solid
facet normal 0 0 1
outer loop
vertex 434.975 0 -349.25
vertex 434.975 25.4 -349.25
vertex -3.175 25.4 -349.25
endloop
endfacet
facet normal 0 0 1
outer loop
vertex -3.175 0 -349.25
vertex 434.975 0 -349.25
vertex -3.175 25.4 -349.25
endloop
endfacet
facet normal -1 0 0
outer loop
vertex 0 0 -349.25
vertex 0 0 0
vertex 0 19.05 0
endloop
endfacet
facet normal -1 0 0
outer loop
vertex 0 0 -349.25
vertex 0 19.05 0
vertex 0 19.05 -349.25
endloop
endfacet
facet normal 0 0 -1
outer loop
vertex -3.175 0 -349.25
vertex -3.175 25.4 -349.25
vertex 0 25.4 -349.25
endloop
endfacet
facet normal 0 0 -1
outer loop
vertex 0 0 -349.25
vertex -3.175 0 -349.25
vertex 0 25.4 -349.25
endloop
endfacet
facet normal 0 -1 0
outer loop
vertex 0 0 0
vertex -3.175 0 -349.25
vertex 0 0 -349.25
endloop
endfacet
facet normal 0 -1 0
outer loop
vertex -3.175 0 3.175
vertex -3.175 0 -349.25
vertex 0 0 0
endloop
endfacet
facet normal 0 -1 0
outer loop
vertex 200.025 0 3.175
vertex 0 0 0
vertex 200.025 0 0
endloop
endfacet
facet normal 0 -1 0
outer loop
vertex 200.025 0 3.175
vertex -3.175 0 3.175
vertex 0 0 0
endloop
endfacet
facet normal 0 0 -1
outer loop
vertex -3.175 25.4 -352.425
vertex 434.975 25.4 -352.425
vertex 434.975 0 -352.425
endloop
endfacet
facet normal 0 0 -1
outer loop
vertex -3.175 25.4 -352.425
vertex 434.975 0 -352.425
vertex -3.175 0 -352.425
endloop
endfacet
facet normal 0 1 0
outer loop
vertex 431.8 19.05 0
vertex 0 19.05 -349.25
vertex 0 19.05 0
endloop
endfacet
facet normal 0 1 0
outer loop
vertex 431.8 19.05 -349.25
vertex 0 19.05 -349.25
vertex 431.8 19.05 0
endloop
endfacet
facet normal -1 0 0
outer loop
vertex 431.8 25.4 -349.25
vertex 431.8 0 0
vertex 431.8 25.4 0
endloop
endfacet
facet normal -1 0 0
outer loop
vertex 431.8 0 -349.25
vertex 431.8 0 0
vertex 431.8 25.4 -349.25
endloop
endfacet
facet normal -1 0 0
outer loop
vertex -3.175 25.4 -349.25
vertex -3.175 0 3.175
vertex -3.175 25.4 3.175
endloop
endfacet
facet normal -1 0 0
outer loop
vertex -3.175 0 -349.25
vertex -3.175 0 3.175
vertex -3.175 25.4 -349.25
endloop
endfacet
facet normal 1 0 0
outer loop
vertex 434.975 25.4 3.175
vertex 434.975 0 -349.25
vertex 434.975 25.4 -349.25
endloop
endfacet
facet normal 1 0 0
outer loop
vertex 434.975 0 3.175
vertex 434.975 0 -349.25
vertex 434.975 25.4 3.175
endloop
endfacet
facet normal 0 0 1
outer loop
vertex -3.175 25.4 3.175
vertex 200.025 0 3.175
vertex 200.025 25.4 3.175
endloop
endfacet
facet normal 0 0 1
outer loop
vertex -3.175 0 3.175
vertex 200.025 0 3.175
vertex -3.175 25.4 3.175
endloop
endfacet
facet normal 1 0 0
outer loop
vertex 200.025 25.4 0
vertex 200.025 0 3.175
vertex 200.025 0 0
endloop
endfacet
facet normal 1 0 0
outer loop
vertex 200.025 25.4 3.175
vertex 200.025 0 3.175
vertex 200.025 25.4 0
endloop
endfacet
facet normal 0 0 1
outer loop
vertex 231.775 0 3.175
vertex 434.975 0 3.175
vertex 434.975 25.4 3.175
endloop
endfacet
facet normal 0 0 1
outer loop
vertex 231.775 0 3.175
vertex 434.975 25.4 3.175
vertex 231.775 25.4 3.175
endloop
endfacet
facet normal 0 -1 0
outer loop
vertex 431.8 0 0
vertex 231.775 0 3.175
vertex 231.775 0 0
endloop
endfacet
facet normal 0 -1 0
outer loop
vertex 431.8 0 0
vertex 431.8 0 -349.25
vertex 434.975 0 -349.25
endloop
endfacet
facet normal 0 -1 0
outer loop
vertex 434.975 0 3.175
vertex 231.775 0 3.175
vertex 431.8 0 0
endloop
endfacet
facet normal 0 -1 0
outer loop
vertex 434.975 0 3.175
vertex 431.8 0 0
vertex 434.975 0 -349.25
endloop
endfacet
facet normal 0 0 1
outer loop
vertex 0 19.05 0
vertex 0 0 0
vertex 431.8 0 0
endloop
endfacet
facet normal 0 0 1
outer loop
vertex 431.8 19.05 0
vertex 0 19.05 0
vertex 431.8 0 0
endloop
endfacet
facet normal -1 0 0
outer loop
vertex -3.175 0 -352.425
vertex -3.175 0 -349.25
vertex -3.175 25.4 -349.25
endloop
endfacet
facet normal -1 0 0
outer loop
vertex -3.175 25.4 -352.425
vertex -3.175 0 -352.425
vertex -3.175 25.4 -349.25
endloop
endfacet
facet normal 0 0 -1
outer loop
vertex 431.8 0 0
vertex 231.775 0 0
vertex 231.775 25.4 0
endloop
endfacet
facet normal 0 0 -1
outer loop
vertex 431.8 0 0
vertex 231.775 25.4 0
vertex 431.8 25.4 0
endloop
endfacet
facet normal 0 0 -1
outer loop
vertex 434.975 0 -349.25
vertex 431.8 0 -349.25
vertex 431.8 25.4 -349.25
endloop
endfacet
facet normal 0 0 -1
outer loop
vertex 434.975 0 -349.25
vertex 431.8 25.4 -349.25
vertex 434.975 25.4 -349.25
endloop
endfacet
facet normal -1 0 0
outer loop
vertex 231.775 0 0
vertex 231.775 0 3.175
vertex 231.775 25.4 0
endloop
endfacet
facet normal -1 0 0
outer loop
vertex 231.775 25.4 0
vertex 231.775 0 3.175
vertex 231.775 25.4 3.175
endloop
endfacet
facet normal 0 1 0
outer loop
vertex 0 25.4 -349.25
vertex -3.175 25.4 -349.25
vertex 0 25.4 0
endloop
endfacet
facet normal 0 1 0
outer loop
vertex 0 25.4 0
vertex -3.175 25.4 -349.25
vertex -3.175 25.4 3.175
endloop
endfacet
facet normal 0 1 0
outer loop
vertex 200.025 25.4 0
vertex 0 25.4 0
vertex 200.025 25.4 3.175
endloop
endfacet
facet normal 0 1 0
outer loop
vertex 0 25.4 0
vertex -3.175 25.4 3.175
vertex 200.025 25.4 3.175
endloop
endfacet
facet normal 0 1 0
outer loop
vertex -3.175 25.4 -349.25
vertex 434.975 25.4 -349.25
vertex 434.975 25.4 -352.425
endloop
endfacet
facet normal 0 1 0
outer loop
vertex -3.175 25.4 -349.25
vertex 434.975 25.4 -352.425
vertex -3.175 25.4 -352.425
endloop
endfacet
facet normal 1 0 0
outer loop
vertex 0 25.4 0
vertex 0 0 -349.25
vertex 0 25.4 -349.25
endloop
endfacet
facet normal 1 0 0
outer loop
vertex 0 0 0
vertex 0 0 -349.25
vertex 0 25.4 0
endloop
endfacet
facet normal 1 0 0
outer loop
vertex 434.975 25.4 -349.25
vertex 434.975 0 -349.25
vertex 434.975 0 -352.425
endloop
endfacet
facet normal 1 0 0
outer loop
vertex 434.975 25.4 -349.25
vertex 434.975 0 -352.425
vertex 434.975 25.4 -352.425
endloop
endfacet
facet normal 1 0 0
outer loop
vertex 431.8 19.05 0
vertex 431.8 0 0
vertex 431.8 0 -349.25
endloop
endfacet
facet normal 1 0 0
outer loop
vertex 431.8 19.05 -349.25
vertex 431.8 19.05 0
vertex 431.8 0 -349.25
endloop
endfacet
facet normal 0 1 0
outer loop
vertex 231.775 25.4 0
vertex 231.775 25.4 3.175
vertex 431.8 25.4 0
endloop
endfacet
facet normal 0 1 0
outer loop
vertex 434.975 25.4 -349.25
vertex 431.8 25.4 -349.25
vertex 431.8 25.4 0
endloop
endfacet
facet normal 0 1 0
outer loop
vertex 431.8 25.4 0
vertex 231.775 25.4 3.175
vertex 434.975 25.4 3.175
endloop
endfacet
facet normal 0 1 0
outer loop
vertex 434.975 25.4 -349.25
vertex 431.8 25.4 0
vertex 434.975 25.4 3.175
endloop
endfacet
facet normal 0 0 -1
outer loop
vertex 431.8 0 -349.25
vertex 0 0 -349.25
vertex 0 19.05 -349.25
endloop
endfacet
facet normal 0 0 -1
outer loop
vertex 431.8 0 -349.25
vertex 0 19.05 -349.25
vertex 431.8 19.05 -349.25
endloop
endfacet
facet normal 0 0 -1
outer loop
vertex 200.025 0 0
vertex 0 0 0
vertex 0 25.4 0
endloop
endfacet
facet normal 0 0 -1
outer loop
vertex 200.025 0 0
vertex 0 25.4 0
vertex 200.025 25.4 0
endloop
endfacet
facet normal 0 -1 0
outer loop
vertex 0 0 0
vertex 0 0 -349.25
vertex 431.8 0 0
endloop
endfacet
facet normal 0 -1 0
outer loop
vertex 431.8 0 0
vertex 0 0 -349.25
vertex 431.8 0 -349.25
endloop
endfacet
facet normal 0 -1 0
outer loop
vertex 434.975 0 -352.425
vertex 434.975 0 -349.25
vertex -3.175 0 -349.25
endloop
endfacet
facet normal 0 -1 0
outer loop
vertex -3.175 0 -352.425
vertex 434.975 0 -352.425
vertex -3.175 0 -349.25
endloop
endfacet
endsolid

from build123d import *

# Parameters (mm, degrees)
SKETCH1_W           = 431.8
SKETCH1_H           = 349.25
BOSS_EXTRUDE1_DEPTH = 19.05
BOSS_EXTRUDE2_DEPTH = 25.4
SKETCH3_W           = 31.75
SKETCH3_H           = 25.4
CUT_EXTRUDE2_DEPTH  = 3.175
SKETCH4_W           = 438.15
SKETCH4_H           = 25.4
BOSS_EXTRUDE3_DEPTH = 3.175


with BuildPart() as part:
    # Sketch1 → Boss-Extrude1 (new body)
    with BuildSketch(Plane(origin=(0, 0, 0), x_dir=(1, 0, 0), z_dir=(0, 1, 0))):
        with Locations((215.9, 174.625)):
            Rectangle(SKETCH1_W, SKETCH1_H)
    extrude(amount=BOSS_EXTRUDE1_DEPTH)


with BuildPart() as body_2:
    # Sketch2 → Boss-Extrude2 (new body)
    with BuildSketch(Plane.XZ):
        Polygon((0, -349.25), (0, 0), (431.8, 0), (431.8, -349.25), (434.975, -349.25), (434.975, 3.175), (-3.175, 3.175), (-3.175, -349.25), align=None)
    extrude(amount=-BOSS_EXTRUDE2_DEPTH)

    # Sketch3 → Cut-Extrude2 (cut)
    with BuildSketch(Plane.XY.offset(3.175)):
        with Locations((215.9, 12.7)):
            Rectangle(SKETCH3_W, SKETCH3_H)
    extrude(amount=-CUT_EXTRUDE2_DEPTH, mode=Mode.SUBTRACT)


with BuildPart() as cut_extrude2_piece_1:
    # of the separate pieces the step leaves, piece 1, a body of its own (cut_extrude2_pieces)
    add(body_2.part.solids().sort_by_distance((231.775, 0, 0))[0])


with BuildPart() as cut_extrude2_piece_2:
    # of the separate pieces the step leaves, piece 2, a body of its own (cut_extrude2_pieces)
    add(body_2.part.solids().sort_by_distance((0, 0, -349.25))[0])


with BuildPart() as body_4:
    # Sketch4 → Boss-Extrude3 (new body)
    with BuildSketch(Plane(origin=(0, 0, -349.25), x_dir=(-1, 0, 0), z_dir=(0, 0, -1))):
        with Locations((-215.9, 12.7)):
            Rectangle(SKETCH4_W, SKETCH4_H)
    extrude(amount=BOSS_EXTRUDE3_DEPTH)


solid = Compound([part.part, cut_extrude2_piece_1.part, cut_extrude2_piece_2.part, body_4.part])
